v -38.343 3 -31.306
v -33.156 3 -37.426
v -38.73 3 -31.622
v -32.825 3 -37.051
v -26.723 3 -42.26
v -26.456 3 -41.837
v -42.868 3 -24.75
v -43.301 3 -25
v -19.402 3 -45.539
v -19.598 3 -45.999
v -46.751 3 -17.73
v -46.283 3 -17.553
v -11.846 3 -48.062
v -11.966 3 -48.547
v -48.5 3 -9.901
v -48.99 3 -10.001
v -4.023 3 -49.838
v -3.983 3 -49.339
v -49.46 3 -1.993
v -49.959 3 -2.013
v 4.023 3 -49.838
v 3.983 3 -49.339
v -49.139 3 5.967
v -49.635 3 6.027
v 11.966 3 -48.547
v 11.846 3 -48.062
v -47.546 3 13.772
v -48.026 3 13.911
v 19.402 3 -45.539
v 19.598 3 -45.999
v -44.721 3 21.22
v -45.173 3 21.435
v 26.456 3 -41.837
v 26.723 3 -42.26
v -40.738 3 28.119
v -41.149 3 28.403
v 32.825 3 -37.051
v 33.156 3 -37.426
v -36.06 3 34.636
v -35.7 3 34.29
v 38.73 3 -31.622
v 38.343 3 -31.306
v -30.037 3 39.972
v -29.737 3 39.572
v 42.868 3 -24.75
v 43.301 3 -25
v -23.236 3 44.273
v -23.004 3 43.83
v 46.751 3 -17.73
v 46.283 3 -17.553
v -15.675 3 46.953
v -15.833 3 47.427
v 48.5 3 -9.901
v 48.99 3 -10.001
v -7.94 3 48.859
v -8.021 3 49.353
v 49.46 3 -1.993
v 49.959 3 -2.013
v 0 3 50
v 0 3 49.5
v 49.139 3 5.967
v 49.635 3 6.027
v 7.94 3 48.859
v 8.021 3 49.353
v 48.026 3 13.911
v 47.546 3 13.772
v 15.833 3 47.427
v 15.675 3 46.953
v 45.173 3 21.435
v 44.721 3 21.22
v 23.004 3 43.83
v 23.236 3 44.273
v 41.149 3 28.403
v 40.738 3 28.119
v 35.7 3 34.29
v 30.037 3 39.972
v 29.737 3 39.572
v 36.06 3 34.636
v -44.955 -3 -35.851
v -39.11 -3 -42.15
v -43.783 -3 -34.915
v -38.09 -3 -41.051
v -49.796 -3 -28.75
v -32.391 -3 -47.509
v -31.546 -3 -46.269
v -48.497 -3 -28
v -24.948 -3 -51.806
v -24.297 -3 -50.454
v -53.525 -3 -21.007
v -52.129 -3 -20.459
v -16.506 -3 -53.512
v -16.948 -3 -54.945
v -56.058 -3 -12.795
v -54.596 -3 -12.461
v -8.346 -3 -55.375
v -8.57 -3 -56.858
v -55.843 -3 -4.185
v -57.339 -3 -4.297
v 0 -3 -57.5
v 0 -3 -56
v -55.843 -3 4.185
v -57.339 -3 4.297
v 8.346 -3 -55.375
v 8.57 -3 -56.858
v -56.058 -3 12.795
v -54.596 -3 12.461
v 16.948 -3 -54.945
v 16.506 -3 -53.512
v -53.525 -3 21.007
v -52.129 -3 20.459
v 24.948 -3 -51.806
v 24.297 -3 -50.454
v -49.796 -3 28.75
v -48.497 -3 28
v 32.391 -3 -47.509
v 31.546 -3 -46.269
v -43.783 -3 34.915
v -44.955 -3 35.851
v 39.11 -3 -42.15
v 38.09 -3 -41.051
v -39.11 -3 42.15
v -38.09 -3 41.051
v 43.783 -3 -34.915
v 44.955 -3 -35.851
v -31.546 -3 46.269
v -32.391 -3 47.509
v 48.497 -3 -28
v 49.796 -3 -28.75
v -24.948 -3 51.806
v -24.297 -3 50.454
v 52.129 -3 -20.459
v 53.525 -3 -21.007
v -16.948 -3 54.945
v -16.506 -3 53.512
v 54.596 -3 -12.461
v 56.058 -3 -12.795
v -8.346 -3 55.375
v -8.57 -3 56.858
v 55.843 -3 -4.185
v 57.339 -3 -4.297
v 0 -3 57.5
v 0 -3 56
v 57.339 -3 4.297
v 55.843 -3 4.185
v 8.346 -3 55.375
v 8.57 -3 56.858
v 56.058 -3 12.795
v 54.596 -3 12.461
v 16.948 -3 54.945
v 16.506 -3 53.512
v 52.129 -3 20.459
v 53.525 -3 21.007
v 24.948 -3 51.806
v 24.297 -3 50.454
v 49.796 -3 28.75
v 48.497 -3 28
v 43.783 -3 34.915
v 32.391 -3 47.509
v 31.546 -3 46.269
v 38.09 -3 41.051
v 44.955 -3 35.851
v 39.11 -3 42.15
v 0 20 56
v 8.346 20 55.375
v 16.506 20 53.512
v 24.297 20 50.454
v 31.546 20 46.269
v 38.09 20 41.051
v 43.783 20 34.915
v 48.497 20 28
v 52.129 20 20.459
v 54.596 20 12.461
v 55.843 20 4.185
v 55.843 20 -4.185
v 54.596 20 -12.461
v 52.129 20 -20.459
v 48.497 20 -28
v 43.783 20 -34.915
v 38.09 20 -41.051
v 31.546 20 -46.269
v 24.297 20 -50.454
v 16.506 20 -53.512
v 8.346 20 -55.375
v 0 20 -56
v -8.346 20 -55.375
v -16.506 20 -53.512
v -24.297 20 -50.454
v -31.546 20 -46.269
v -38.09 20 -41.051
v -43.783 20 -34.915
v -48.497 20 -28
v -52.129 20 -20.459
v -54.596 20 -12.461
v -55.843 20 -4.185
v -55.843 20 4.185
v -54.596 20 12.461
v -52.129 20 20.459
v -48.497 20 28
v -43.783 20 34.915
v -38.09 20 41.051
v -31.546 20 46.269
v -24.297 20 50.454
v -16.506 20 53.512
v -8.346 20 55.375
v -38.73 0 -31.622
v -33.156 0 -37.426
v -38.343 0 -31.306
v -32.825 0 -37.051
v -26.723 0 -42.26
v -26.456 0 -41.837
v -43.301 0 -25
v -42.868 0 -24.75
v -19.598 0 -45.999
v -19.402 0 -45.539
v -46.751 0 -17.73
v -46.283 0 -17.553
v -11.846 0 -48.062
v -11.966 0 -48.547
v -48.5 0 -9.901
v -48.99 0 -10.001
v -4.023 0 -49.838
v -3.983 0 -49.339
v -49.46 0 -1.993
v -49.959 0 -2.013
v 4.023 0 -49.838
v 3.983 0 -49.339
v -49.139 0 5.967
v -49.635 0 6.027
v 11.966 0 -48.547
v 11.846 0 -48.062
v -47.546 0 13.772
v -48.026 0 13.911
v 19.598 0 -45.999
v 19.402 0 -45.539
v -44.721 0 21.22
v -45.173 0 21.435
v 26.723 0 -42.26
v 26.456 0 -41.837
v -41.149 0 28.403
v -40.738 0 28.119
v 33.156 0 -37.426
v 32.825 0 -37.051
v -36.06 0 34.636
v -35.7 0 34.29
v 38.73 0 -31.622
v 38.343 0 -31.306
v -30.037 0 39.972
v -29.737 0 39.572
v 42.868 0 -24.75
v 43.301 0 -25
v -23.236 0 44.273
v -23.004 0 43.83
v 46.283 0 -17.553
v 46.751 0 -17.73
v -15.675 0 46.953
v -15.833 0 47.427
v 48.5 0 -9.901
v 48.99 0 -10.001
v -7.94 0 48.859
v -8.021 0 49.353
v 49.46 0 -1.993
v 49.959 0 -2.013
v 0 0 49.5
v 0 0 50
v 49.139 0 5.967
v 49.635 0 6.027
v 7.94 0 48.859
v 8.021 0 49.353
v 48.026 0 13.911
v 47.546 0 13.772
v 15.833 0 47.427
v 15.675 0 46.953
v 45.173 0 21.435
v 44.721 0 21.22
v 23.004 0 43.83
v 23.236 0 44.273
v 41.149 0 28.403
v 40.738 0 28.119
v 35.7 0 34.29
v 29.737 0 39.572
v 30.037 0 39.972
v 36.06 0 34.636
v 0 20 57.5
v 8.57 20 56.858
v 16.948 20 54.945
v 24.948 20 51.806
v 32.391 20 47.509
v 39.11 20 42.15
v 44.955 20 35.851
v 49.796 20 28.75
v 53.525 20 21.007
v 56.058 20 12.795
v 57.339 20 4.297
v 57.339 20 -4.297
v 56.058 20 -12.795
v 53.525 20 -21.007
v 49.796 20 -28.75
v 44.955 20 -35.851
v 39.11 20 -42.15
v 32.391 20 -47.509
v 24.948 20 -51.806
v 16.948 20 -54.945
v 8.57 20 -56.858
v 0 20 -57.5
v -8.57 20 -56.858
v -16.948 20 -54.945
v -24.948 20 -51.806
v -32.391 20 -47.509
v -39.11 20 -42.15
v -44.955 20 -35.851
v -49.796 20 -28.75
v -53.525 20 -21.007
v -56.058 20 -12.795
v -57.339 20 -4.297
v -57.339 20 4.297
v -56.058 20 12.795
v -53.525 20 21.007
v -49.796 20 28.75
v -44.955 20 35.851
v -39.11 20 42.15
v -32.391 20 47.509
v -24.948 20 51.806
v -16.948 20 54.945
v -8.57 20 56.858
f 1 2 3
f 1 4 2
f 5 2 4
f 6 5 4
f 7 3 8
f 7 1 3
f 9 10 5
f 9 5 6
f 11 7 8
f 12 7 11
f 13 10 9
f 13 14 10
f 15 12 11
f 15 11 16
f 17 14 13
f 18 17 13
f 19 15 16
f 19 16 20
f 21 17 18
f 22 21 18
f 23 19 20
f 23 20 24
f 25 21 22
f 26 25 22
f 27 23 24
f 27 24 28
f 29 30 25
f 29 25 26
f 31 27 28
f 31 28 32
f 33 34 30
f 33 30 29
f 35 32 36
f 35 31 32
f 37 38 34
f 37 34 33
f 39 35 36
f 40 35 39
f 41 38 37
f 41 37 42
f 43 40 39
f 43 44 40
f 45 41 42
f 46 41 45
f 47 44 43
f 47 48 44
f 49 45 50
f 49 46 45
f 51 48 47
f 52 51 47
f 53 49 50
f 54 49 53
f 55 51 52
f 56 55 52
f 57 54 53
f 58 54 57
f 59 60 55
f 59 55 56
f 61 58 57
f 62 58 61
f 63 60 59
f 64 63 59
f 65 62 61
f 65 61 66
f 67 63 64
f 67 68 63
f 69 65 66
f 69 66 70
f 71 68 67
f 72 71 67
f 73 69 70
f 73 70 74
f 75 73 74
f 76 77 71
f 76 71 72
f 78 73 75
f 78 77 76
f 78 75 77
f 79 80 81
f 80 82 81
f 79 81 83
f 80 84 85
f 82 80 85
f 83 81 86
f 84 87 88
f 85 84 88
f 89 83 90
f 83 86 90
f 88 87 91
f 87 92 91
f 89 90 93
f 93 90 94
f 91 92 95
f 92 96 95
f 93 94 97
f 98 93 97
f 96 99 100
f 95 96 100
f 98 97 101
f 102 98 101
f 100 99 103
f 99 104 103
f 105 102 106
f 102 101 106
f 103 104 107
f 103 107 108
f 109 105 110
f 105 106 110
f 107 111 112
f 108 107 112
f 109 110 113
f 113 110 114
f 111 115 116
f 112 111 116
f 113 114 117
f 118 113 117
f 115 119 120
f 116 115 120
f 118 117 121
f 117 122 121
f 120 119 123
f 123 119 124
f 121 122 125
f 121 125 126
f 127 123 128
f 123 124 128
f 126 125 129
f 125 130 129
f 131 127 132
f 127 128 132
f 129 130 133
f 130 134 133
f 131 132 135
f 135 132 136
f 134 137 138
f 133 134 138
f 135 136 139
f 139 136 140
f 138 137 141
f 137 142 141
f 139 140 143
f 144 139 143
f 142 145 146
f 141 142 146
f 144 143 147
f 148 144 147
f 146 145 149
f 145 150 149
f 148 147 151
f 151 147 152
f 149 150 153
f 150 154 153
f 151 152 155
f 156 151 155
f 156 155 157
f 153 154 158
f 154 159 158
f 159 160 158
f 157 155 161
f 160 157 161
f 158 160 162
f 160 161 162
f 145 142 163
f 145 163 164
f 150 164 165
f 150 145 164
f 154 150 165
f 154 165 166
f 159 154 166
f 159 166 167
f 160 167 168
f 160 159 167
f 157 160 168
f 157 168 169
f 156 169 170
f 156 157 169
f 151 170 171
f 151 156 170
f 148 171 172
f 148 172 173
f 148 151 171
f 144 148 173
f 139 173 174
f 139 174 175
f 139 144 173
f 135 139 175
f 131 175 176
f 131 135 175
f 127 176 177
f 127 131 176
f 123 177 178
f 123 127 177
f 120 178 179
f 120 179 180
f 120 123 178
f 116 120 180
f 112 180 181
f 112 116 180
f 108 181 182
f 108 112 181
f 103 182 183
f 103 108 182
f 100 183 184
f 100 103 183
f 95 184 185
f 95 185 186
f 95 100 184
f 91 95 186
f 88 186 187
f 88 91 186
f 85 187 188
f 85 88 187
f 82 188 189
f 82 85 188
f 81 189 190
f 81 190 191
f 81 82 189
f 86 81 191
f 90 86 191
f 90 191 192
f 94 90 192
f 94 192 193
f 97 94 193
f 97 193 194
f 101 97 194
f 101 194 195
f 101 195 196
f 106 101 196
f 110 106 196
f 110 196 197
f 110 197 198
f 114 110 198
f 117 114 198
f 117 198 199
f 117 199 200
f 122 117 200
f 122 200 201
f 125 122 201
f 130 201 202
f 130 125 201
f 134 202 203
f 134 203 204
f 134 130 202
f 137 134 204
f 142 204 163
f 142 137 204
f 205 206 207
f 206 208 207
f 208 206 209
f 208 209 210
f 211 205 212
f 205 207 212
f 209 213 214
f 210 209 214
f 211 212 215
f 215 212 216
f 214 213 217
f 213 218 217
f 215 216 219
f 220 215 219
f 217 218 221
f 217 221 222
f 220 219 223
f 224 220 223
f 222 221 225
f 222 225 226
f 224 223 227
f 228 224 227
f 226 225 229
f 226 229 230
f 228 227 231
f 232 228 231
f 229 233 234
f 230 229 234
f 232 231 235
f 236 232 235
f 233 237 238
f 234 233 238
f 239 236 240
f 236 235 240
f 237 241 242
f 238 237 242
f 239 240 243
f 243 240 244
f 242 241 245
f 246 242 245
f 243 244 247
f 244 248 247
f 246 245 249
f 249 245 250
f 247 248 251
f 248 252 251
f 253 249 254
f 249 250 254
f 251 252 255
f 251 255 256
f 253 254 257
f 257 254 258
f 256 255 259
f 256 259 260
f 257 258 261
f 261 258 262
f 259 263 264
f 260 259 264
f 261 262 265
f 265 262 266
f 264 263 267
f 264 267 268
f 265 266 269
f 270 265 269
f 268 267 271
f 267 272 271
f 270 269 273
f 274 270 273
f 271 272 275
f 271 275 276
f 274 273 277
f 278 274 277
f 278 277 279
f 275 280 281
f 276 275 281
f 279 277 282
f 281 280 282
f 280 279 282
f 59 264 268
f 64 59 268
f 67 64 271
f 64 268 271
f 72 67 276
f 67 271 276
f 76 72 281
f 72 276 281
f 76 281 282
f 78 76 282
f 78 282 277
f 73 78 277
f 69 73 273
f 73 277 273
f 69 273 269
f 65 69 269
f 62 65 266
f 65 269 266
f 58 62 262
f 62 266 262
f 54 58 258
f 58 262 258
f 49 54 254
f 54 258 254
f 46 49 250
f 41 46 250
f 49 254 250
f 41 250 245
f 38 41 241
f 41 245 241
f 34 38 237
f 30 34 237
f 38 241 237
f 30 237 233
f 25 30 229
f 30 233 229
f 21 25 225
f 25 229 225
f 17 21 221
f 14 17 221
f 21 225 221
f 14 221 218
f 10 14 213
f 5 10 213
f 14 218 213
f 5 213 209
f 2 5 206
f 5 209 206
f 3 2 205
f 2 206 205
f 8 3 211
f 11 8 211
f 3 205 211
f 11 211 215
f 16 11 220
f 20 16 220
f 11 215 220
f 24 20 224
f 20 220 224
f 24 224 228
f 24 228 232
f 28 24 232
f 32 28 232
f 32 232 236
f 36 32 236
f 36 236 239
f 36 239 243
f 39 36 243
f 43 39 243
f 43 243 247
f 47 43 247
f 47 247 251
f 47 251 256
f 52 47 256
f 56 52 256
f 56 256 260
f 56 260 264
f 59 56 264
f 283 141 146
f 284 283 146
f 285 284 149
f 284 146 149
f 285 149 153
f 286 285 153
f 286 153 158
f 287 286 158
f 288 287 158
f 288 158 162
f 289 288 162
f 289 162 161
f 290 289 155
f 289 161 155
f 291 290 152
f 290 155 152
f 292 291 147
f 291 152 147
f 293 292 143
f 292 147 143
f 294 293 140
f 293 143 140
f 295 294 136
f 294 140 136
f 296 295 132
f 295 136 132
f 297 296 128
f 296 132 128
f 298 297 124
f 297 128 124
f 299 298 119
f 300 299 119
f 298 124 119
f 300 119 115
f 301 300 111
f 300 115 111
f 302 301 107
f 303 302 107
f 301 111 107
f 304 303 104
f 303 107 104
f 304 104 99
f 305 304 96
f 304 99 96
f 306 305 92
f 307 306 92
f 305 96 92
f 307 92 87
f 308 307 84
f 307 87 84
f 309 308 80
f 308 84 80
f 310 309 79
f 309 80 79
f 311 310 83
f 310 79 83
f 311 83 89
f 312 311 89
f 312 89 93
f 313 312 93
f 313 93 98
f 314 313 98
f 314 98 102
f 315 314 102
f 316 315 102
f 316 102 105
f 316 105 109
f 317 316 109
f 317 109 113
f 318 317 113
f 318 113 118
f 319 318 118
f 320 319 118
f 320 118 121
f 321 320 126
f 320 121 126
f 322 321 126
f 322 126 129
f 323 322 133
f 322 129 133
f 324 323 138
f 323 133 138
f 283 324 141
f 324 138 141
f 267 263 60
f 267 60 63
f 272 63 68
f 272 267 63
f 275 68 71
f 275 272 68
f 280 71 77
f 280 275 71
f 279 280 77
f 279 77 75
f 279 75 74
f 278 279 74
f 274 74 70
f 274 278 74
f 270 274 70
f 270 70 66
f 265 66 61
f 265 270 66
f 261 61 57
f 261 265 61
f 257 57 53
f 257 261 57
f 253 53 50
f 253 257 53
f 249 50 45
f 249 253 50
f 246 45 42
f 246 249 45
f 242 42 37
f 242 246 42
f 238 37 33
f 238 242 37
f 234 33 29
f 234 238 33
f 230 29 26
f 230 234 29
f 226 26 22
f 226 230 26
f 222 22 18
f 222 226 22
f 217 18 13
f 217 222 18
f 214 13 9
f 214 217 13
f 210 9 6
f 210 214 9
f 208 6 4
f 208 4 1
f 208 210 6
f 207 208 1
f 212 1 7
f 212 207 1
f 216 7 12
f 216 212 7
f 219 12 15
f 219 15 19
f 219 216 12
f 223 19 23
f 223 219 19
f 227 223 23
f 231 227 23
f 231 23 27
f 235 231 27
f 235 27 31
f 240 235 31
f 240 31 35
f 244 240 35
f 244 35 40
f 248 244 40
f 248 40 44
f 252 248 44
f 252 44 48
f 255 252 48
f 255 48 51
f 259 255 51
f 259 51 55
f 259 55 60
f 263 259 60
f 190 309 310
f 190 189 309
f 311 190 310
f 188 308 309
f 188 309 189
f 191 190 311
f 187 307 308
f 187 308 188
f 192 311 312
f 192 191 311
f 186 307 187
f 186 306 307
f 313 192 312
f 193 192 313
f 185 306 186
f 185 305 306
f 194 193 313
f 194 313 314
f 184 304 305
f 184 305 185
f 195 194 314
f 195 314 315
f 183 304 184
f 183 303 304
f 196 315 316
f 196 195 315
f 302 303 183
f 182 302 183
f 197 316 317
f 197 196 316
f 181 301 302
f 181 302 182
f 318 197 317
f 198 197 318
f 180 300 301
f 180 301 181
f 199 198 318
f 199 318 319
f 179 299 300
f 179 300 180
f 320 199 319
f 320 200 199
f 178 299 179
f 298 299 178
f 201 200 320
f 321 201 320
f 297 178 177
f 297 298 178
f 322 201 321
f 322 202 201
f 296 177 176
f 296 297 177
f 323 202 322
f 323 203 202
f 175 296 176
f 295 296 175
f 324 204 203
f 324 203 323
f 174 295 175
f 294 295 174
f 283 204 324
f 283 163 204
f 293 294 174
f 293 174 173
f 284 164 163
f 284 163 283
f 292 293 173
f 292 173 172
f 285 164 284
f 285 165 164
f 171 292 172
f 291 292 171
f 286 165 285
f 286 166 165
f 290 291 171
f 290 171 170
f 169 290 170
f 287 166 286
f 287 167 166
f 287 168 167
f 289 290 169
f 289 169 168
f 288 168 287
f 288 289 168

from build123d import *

# Parameters (mm, degrees)
SKETCH27_R                = 50
SKETCH27_R_2              = 49.5
BOSS_EXTRUDE10_DEPTH      = 3
BOSS_EXTRUDE11_DEPTH      = 20
BOSS_EXTRUDE11_DEPTH_BACK = 3
SKETCH28_R                = 57.5
SKETCH28_R_2              = 56


with BuildPart() as part:
    # Sketch27 → Boss-Extrude10 (new body)
    with BuildSketch(Plane(origin=(0, 0, 0), x_dir=(1, 0, 0), z_dir=(0, 1, 0))):
        Circle(SKETCH27_R)
        Circle(SKETCH27_R_2, mode=Mode.SUBTRACT)
    extrude(amount=BOSS_EXTRUDE10_DEPTH)


with BuildPart() as body_2:
    # Sketch28 → Boss-Extrude11 (new, two sides: drawn at the far end of the back side and taken through both)
    with BuildSketch(Plane(origin=(0, 0, 0), x_dir=(1, 0, 0), z_dir=(0, 1, 0)).offset(-BOSS_EXTRUDE11_DEPTH_BACK)):
        Circle(SKETCH28_R)
        Circle(SKETCH28_R_2, mode=Mode.SUBTRACT)
    extrude(amount=BOSS_EXTRUDE11_DEPTH + BOSS_EXTRUDE11_DEPTH_BACK)


solid = Compound([part.part, body_2.part])
